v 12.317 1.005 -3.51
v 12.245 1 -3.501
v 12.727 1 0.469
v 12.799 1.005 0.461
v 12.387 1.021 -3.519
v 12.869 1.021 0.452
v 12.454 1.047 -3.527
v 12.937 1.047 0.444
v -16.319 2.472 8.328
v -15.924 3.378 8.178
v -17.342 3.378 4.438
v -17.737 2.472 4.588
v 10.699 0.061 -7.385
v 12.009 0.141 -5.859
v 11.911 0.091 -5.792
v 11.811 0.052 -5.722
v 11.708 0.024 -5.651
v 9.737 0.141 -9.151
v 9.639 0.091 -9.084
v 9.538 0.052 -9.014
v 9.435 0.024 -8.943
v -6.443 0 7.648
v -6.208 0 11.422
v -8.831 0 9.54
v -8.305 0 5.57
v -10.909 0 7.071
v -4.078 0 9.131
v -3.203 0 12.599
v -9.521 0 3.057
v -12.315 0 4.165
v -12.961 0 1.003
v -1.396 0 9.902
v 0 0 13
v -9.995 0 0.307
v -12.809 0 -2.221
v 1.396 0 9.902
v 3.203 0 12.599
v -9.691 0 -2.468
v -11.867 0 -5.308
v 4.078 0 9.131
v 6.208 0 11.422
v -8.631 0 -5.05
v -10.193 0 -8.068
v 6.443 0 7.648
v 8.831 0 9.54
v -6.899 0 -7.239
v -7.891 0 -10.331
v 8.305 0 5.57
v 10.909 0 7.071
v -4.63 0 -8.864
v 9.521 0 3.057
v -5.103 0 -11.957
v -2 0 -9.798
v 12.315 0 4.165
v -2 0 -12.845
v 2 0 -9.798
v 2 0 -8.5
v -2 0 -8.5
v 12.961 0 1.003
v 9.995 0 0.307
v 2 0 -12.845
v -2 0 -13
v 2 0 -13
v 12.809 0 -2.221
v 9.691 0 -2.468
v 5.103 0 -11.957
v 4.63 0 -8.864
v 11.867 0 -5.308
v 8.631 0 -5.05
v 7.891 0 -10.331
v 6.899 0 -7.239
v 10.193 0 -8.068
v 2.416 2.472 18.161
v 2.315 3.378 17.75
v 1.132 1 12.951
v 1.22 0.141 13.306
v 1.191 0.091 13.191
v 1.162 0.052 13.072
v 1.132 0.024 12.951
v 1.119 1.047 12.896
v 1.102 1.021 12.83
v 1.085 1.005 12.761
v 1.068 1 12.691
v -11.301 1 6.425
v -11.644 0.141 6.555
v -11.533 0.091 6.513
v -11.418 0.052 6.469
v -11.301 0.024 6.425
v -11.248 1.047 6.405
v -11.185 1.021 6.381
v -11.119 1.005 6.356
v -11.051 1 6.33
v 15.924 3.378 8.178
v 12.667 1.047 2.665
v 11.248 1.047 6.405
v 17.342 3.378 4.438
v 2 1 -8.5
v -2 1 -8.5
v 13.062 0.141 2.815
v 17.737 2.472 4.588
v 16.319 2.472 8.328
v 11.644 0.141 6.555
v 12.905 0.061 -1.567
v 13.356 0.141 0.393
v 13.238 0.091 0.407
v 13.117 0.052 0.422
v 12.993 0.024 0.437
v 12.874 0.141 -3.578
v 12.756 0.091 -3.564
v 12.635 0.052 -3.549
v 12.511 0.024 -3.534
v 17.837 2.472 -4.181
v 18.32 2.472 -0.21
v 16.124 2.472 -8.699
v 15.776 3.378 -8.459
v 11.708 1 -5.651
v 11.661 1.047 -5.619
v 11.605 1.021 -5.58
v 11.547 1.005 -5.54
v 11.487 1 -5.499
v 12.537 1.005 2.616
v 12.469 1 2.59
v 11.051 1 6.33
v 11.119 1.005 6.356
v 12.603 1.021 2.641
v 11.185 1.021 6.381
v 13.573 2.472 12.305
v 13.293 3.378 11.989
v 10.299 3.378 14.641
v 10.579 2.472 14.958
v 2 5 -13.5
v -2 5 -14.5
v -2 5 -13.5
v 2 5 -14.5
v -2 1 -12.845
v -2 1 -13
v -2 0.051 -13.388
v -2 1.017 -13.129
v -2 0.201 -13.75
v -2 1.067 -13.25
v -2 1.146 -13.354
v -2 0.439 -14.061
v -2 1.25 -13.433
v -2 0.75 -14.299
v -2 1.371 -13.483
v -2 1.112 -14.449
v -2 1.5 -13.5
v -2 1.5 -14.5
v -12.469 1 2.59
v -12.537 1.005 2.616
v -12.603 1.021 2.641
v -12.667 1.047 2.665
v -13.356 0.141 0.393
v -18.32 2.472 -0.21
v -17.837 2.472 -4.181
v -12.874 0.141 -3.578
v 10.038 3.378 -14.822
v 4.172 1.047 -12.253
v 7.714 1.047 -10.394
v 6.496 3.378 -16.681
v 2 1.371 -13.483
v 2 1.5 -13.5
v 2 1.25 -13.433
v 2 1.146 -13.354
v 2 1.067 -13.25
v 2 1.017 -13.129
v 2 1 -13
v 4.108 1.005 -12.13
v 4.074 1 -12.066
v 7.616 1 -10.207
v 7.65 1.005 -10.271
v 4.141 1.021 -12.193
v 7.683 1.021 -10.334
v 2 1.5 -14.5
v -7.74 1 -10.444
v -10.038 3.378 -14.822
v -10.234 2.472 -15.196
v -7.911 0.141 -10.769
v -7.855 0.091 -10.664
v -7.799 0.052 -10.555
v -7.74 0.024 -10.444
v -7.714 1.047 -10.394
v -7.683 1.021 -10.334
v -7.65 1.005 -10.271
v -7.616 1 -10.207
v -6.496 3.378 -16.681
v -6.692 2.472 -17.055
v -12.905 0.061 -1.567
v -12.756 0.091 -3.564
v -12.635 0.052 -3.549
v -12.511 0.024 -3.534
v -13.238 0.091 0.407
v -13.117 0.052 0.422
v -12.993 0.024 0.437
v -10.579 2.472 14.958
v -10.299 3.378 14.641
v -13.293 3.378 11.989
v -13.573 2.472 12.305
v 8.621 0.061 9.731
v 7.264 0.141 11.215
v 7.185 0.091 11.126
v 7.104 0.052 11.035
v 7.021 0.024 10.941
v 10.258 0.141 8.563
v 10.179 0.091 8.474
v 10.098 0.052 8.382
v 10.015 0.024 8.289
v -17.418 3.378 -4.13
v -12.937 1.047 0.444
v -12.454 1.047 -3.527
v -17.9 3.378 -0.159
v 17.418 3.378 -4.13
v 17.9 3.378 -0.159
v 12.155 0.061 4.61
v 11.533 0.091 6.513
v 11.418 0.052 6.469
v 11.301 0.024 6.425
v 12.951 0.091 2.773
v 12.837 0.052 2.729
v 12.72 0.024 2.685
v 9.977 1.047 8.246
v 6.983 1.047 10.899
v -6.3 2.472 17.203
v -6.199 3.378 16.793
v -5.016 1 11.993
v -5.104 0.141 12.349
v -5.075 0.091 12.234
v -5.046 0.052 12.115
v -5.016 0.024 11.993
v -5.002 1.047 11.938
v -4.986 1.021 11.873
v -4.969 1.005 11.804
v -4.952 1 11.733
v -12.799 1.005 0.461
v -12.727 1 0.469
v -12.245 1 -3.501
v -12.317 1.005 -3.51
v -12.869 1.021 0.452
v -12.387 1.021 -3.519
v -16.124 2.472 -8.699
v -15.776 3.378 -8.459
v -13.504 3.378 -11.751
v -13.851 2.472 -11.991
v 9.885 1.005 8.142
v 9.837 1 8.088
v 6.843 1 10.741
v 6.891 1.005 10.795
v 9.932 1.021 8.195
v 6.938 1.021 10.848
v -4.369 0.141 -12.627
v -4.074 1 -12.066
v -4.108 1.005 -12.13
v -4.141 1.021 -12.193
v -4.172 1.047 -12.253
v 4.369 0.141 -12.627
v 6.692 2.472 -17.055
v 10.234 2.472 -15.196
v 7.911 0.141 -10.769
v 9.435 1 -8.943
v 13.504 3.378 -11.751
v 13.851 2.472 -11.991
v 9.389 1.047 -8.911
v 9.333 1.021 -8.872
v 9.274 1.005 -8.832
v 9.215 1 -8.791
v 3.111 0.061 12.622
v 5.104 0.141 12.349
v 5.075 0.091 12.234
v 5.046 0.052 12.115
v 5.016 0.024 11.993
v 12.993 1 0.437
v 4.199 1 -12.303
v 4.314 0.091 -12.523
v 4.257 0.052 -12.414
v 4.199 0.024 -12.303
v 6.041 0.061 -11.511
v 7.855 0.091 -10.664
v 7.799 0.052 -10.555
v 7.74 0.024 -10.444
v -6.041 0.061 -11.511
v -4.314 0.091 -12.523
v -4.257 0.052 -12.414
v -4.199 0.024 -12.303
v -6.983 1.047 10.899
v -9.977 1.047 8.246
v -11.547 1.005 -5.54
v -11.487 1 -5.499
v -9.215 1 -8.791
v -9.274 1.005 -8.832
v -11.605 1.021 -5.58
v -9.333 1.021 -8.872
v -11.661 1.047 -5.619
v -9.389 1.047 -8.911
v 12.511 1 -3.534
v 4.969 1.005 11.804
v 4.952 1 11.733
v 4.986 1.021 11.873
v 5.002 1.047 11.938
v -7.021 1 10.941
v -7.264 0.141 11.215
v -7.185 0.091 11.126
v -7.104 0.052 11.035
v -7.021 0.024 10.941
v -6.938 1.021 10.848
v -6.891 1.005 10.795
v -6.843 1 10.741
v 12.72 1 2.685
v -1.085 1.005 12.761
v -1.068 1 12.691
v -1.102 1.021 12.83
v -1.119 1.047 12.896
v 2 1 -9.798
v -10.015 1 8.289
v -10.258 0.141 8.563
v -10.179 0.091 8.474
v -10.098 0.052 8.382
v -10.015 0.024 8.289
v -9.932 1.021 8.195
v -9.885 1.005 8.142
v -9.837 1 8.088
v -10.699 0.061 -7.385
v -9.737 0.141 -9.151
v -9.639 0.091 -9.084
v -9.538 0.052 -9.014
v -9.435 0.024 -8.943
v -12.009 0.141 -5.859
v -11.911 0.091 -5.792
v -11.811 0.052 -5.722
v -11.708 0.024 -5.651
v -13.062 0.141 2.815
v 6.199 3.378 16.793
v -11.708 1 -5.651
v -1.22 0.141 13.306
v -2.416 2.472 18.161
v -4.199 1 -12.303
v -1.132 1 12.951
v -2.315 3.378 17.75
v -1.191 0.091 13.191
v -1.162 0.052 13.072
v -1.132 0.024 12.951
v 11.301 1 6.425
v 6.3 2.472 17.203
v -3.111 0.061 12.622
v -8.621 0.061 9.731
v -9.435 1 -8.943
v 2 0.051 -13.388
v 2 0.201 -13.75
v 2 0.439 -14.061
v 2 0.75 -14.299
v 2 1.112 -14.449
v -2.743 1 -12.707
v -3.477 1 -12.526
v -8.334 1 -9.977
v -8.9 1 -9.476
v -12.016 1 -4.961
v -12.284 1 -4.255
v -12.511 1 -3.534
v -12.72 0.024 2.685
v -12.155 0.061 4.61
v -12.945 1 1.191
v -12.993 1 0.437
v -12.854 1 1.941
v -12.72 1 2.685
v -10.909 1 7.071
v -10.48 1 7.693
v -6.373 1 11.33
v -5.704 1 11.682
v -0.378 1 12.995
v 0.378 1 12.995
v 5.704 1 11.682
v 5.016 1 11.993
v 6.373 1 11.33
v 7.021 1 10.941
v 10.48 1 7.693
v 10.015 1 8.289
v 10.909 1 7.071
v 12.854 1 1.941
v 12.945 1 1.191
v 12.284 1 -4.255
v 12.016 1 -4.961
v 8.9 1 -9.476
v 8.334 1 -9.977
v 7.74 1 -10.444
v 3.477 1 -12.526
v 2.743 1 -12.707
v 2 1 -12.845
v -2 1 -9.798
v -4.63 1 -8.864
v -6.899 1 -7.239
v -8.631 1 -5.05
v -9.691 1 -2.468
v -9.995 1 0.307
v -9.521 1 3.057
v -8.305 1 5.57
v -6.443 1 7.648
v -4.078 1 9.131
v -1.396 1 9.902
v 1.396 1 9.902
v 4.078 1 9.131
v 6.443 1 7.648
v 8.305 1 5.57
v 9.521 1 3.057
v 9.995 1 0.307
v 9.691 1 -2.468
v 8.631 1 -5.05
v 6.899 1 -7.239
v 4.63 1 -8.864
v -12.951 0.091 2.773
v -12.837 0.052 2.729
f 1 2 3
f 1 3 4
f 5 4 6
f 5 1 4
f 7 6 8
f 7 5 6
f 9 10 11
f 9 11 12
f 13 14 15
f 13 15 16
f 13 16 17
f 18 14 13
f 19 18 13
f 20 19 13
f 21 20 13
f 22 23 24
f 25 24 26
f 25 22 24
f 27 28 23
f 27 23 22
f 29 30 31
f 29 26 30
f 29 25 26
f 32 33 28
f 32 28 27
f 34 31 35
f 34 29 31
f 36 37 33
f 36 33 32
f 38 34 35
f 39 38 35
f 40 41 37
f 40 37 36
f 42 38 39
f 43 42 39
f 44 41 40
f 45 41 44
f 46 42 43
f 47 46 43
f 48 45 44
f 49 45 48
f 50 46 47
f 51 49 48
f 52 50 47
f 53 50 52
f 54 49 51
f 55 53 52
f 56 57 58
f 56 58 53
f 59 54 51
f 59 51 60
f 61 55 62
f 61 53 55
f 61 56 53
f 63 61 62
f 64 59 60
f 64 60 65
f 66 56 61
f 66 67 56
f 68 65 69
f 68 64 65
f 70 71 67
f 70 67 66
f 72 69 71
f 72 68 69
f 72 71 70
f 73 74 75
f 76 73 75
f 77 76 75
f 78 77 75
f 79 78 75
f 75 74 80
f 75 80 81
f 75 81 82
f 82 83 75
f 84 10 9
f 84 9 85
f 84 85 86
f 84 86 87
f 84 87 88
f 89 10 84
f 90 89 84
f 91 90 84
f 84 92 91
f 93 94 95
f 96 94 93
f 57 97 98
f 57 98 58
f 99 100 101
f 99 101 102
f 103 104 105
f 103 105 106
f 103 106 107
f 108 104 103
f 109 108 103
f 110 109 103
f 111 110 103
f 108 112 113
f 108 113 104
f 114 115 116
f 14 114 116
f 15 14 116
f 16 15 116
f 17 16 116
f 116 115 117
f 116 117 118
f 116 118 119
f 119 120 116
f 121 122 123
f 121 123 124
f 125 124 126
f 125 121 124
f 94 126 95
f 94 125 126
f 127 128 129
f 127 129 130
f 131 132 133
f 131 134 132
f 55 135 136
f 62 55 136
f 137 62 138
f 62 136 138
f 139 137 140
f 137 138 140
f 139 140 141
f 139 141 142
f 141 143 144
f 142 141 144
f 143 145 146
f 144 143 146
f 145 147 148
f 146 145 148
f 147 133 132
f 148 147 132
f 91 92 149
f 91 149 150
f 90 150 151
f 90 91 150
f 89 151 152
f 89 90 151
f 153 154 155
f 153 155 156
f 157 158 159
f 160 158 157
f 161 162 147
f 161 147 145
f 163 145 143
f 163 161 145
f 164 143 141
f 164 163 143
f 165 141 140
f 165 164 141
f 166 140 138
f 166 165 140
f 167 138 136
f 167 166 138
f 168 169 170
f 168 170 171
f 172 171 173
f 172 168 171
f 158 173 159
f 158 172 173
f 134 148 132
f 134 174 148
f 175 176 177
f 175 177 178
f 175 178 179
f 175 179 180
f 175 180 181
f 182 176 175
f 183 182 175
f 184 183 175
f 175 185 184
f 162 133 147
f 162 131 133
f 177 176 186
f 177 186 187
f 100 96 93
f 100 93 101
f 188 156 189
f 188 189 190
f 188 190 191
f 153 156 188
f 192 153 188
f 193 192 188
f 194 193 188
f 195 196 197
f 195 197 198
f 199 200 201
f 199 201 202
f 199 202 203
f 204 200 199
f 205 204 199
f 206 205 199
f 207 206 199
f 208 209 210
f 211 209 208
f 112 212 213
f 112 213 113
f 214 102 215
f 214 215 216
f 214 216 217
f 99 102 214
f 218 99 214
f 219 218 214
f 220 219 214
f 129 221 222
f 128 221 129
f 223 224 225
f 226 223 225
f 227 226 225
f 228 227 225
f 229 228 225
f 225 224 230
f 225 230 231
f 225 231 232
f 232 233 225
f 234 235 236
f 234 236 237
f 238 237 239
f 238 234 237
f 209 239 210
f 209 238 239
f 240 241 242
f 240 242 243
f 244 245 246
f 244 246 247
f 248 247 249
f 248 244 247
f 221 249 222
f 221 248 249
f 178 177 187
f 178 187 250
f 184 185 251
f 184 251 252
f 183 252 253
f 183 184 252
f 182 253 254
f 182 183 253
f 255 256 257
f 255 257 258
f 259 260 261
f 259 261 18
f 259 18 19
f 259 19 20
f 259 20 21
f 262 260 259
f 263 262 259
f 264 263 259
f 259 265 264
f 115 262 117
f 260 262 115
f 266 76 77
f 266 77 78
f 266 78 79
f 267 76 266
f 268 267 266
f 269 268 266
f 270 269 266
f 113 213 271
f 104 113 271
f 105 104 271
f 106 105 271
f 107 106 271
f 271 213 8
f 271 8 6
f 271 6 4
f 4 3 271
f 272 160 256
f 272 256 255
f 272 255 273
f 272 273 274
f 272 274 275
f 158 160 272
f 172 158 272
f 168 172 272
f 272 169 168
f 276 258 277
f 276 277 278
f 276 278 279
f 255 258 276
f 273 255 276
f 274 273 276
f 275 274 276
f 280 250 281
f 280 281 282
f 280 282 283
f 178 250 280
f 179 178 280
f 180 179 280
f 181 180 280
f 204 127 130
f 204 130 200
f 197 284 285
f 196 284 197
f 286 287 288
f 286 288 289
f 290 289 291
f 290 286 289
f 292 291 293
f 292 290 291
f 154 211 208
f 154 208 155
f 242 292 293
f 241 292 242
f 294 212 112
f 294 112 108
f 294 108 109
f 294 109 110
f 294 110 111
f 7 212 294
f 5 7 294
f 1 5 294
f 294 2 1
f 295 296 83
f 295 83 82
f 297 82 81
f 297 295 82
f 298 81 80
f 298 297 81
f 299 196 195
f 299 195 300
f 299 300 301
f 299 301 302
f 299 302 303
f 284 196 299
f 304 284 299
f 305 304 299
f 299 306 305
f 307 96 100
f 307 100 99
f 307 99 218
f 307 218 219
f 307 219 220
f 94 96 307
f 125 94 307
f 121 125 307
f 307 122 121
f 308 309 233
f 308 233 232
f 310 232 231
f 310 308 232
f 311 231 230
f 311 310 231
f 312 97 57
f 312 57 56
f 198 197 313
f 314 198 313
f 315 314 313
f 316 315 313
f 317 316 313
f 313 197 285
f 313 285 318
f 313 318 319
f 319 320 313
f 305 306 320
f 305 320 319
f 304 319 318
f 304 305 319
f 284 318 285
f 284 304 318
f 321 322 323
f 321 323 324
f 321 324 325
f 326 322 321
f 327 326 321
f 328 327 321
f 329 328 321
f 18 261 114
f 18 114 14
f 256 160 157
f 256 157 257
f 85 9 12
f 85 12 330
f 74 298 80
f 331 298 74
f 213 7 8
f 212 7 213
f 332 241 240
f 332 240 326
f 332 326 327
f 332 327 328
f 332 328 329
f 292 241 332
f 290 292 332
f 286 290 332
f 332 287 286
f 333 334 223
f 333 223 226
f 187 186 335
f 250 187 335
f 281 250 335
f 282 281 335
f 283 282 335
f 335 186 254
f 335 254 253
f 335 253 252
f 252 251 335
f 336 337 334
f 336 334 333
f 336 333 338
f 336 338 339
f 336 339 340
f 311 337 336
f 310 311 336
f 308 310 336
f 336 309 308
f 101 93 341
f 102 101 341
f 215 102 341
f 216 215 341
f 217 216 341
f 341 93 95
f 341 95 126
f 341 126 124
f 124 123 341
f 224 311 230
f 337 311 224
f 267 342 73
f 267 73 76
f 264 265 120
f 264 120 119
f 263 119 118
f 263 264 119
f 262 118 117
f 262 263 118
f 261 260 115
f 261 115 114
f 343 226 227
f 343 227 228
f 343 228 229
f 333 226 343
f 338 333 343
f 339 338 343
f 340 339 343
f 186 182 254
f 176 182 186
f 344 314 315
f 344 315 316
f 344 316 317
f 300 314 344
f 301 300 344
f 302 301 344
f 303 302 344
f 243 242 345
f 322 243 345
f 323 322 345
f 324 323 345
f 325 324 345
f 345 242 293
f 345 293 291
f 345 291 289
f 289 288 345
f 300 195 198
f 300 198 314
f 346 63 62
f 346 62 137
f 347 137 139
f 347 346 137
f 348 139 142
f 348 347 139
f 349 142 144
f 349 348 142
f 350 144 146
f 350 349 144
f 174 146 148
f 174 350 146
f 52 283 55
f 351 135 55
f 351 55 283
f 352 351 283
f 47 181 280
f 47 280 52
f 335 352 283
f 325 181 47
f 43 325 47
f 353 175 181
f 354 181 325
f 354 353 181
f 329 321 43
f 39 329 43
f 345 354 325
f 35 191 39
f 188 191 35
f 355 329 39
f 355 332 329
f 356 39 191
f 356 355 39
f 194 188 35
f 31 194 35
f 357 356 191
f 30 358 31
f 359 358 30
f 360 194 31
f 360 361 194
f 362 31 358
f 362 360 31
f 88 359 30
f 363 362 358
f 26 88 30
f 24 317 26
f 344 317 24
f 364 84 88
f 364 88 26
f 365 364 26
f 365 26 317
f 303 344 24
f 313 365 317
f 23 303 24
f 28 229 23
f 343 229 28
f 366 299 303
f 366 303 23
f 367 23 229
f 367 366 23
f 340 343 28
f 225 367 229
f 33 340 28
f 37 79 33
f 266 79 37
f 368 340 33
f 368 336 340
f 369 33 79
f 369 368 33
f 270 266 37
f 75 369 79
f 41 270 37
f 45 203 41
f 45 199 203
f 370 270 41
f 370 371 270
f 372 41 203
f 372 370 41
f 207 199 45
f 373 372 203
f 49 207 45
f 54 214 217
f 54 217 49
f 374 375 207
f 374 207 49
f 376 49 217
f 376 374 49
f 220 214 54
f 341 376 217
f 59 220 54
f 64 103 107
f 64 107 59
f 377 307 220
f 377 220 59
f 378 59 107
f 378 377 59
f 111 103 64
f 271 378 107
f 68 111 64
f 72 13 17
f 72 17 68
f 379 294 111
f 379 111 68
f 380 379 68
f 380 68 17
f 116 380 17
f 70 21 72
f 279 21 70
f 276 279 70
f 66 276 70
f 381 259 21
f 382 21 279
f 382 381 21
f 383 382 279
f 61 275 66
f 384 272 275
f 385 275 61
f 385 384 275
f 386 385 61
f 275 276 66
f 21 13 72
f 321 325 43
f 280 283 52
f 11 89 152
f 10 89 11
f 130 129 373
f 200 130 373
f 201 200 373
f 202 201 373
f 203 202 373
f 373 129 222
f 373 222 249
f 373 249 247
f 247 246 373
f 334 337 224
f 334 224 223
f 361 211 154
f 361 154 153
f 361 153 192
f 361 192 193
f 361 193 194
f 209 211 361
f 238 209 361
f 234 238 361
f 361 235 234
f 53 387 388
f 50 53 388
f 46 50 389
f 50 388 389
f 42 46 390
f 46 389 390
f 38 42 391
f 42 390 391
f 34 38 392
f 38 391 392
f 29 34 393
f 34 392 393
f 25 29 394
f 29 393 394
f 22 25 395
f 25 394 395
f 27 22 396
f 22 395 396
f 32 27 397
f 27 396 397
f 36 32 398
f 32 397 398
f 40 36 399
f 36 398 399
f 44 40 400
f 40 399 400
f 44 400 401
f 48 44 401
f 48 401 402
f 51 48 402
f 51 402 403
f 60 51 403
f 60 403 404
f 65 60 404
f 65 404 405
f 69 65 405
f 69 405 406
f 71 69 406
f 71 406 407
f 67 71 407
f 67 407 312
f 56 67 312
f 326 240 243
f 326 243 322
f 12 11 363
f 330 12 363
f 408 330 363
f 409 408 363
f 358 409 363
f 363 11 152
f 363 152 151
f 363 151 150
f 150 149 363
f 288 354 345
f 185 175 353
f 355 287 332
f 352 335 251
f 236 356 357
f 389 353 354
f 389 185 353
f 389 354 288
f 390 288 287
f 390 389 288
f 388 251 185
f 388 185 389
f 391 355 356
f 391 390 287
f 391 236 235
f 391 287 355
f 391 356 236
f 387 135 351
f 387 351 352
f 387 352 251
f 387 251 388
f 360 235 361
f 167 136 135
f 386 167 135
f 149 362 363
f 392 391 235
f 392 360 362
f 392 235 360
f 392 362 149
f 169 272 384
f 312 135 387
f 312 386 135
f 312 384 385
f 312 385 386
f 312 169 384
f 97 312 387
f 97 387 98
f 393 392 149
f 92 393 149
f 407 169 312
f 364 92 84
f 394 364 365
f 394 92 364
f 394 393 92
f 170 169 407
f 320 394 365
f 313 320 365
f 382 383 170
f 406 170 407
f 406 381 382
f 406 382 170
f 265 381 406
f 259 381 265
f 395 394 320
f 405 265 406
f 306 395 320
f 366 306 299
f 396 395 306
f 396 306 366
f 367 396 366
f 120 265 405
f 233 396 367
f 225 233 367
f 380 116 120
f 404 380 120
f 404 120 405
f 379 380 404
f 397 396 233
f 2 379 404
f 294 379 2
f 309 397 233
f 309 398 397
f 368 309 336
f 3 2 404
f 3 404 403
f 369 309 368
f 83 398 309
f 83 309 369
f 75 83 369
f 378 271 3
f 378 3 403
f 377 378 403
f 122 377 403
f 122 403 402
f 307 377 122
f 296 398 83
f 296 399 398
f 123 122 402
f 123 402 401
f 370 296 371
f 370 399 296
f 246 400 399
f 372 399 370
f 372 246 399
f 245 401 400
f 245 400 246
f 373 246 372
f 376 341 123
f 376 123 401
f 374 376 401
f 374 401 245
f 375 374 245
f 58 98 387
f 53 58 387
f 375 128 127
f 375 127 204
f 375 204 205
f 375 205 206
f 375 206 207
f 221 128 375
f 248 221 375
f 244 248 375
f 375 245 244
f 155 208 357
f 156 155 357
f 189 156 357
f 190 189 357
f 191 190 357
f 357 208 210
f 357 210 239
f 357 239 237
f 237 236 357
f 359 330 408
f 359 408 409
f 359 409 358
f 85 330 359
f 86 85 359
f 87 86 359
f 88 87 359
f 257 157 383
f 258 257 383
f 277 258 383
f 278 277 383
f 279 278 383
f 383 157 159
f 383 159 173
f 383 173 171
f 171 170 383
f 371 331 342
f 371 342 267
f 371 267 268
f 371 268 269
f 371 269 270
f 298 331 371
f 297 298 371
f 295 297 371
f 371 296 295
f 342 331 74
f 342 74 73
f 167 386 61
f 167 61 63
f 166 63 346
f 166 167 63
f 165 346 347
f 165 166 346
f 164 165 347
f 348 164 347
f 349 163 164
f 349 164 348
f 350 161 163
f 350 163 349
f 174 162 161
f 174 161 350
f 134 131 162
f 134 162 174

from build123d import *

# Parameters (mm, degrees)
ESQUISSE1_W             = 3
ESQUISSE1_H             = 1
LANGUETTE_PLI_E_DEPTH   = 2
LANGUETTE_DEPTH         = 2
NBR_DE_LANGUETTES_COUNT = 12
NBR_DE_LANGUETTES_ANGLE = 304.615384615


with BuildPart() as part:
    # Esquisse1 → Base (revolve)
    with BuildSketch(Plane.XY, mode=Mode.PRIVATE) as base_sk:
        with Locations((11.5, 0.5)):
            Rectangle(ESQUISSE1_W, ESQUISSE1_H)
    revolve(base_sk.sketch.rotate(Axis((0, 0, 0), (0, 1, 0)), 90), axis=Axis((0, 0, 0), (0, 1, 0)))

    # Esquisse3 → Languette pliée (add, symmetric)
    with BuildSketch(Plane(origin=(0, 0, 0), x_dir=(0, 0, -1), z_dir=(1, 0, 0))):
        with BuildLine():
            Line((13.5, 5), (13.5, 1.5))
            ThreePointArc((13.5, 1.5), (13.353553391, 1.146446609), (13, 1))
            Line((13, 1), (10, 1))
            Line((10, 1), (8.5, 1))
            Line((8.5, 1), (8.5, 0))
            Line((8.5, 0), (10, 0))
            Line((10, 0), (13, 0))
            ThreePointArc((13, 0), (14.060660172, 0.439339828), (14.5, 1.5))
            Line((14.5, 1.5), (14.5, 5))
            Line((14.5, 5), (13.5, 5))
        make_face()
    extrude(amount=LANGUETTE_PLI_E_DEPTH, both=True)

    # Esquisse2 → Languette (add, symmetric)
    with BuildSketch(Plane(origin=(0, 0, 0), x_dir=(-0.46472317204377556, 0, 0.8854560256532064), z_dir=(-0.8854560256532064, 0, -0.46472317204377556))):
        with BuildLine():
            Line((-10, 1), (-12.577381738, 1))
            ThreePointArc((-12.577381738, 1), (-12.685601545, 1.011851996), (-12.788690869, 1.046846106))
            Line((-12.788690869, 1.046846106), (-17.788690869, 3.378384397))
            Line((-17.788690869, 3.378384397), (-18.211309131, 2.47207661))
            Line((-18.211309131, 2.47207661), (-13.211309131, 0.140538319))
            ThreePointArc((-13.211309131, 0.140538319), (-12.902041159, 0.035555989), (-12.577381738, 0))
            Line((-12.577381738, 0), (-10, 0))
            Line((-10, 0), (-10, 1))
        make_face()
    languette = extrude(amount=LANGUETTE_DEPTH, both=True)

    # Nbr de languettes: Languette ×12 about axis
    nbr_de_languettes_axis = Axis((0, 0, 0), (0, -1, 0))
    for i in range(1, NBR_DE_LANGUETTES_COUNT):
        add(languette.rotate(nbr_de_languettes_axis, i * NBR_DE_LANGUETTES_ANGLE / (NBR_DE_LANGUETTES_COUNT - 1)))


solid = part.part
